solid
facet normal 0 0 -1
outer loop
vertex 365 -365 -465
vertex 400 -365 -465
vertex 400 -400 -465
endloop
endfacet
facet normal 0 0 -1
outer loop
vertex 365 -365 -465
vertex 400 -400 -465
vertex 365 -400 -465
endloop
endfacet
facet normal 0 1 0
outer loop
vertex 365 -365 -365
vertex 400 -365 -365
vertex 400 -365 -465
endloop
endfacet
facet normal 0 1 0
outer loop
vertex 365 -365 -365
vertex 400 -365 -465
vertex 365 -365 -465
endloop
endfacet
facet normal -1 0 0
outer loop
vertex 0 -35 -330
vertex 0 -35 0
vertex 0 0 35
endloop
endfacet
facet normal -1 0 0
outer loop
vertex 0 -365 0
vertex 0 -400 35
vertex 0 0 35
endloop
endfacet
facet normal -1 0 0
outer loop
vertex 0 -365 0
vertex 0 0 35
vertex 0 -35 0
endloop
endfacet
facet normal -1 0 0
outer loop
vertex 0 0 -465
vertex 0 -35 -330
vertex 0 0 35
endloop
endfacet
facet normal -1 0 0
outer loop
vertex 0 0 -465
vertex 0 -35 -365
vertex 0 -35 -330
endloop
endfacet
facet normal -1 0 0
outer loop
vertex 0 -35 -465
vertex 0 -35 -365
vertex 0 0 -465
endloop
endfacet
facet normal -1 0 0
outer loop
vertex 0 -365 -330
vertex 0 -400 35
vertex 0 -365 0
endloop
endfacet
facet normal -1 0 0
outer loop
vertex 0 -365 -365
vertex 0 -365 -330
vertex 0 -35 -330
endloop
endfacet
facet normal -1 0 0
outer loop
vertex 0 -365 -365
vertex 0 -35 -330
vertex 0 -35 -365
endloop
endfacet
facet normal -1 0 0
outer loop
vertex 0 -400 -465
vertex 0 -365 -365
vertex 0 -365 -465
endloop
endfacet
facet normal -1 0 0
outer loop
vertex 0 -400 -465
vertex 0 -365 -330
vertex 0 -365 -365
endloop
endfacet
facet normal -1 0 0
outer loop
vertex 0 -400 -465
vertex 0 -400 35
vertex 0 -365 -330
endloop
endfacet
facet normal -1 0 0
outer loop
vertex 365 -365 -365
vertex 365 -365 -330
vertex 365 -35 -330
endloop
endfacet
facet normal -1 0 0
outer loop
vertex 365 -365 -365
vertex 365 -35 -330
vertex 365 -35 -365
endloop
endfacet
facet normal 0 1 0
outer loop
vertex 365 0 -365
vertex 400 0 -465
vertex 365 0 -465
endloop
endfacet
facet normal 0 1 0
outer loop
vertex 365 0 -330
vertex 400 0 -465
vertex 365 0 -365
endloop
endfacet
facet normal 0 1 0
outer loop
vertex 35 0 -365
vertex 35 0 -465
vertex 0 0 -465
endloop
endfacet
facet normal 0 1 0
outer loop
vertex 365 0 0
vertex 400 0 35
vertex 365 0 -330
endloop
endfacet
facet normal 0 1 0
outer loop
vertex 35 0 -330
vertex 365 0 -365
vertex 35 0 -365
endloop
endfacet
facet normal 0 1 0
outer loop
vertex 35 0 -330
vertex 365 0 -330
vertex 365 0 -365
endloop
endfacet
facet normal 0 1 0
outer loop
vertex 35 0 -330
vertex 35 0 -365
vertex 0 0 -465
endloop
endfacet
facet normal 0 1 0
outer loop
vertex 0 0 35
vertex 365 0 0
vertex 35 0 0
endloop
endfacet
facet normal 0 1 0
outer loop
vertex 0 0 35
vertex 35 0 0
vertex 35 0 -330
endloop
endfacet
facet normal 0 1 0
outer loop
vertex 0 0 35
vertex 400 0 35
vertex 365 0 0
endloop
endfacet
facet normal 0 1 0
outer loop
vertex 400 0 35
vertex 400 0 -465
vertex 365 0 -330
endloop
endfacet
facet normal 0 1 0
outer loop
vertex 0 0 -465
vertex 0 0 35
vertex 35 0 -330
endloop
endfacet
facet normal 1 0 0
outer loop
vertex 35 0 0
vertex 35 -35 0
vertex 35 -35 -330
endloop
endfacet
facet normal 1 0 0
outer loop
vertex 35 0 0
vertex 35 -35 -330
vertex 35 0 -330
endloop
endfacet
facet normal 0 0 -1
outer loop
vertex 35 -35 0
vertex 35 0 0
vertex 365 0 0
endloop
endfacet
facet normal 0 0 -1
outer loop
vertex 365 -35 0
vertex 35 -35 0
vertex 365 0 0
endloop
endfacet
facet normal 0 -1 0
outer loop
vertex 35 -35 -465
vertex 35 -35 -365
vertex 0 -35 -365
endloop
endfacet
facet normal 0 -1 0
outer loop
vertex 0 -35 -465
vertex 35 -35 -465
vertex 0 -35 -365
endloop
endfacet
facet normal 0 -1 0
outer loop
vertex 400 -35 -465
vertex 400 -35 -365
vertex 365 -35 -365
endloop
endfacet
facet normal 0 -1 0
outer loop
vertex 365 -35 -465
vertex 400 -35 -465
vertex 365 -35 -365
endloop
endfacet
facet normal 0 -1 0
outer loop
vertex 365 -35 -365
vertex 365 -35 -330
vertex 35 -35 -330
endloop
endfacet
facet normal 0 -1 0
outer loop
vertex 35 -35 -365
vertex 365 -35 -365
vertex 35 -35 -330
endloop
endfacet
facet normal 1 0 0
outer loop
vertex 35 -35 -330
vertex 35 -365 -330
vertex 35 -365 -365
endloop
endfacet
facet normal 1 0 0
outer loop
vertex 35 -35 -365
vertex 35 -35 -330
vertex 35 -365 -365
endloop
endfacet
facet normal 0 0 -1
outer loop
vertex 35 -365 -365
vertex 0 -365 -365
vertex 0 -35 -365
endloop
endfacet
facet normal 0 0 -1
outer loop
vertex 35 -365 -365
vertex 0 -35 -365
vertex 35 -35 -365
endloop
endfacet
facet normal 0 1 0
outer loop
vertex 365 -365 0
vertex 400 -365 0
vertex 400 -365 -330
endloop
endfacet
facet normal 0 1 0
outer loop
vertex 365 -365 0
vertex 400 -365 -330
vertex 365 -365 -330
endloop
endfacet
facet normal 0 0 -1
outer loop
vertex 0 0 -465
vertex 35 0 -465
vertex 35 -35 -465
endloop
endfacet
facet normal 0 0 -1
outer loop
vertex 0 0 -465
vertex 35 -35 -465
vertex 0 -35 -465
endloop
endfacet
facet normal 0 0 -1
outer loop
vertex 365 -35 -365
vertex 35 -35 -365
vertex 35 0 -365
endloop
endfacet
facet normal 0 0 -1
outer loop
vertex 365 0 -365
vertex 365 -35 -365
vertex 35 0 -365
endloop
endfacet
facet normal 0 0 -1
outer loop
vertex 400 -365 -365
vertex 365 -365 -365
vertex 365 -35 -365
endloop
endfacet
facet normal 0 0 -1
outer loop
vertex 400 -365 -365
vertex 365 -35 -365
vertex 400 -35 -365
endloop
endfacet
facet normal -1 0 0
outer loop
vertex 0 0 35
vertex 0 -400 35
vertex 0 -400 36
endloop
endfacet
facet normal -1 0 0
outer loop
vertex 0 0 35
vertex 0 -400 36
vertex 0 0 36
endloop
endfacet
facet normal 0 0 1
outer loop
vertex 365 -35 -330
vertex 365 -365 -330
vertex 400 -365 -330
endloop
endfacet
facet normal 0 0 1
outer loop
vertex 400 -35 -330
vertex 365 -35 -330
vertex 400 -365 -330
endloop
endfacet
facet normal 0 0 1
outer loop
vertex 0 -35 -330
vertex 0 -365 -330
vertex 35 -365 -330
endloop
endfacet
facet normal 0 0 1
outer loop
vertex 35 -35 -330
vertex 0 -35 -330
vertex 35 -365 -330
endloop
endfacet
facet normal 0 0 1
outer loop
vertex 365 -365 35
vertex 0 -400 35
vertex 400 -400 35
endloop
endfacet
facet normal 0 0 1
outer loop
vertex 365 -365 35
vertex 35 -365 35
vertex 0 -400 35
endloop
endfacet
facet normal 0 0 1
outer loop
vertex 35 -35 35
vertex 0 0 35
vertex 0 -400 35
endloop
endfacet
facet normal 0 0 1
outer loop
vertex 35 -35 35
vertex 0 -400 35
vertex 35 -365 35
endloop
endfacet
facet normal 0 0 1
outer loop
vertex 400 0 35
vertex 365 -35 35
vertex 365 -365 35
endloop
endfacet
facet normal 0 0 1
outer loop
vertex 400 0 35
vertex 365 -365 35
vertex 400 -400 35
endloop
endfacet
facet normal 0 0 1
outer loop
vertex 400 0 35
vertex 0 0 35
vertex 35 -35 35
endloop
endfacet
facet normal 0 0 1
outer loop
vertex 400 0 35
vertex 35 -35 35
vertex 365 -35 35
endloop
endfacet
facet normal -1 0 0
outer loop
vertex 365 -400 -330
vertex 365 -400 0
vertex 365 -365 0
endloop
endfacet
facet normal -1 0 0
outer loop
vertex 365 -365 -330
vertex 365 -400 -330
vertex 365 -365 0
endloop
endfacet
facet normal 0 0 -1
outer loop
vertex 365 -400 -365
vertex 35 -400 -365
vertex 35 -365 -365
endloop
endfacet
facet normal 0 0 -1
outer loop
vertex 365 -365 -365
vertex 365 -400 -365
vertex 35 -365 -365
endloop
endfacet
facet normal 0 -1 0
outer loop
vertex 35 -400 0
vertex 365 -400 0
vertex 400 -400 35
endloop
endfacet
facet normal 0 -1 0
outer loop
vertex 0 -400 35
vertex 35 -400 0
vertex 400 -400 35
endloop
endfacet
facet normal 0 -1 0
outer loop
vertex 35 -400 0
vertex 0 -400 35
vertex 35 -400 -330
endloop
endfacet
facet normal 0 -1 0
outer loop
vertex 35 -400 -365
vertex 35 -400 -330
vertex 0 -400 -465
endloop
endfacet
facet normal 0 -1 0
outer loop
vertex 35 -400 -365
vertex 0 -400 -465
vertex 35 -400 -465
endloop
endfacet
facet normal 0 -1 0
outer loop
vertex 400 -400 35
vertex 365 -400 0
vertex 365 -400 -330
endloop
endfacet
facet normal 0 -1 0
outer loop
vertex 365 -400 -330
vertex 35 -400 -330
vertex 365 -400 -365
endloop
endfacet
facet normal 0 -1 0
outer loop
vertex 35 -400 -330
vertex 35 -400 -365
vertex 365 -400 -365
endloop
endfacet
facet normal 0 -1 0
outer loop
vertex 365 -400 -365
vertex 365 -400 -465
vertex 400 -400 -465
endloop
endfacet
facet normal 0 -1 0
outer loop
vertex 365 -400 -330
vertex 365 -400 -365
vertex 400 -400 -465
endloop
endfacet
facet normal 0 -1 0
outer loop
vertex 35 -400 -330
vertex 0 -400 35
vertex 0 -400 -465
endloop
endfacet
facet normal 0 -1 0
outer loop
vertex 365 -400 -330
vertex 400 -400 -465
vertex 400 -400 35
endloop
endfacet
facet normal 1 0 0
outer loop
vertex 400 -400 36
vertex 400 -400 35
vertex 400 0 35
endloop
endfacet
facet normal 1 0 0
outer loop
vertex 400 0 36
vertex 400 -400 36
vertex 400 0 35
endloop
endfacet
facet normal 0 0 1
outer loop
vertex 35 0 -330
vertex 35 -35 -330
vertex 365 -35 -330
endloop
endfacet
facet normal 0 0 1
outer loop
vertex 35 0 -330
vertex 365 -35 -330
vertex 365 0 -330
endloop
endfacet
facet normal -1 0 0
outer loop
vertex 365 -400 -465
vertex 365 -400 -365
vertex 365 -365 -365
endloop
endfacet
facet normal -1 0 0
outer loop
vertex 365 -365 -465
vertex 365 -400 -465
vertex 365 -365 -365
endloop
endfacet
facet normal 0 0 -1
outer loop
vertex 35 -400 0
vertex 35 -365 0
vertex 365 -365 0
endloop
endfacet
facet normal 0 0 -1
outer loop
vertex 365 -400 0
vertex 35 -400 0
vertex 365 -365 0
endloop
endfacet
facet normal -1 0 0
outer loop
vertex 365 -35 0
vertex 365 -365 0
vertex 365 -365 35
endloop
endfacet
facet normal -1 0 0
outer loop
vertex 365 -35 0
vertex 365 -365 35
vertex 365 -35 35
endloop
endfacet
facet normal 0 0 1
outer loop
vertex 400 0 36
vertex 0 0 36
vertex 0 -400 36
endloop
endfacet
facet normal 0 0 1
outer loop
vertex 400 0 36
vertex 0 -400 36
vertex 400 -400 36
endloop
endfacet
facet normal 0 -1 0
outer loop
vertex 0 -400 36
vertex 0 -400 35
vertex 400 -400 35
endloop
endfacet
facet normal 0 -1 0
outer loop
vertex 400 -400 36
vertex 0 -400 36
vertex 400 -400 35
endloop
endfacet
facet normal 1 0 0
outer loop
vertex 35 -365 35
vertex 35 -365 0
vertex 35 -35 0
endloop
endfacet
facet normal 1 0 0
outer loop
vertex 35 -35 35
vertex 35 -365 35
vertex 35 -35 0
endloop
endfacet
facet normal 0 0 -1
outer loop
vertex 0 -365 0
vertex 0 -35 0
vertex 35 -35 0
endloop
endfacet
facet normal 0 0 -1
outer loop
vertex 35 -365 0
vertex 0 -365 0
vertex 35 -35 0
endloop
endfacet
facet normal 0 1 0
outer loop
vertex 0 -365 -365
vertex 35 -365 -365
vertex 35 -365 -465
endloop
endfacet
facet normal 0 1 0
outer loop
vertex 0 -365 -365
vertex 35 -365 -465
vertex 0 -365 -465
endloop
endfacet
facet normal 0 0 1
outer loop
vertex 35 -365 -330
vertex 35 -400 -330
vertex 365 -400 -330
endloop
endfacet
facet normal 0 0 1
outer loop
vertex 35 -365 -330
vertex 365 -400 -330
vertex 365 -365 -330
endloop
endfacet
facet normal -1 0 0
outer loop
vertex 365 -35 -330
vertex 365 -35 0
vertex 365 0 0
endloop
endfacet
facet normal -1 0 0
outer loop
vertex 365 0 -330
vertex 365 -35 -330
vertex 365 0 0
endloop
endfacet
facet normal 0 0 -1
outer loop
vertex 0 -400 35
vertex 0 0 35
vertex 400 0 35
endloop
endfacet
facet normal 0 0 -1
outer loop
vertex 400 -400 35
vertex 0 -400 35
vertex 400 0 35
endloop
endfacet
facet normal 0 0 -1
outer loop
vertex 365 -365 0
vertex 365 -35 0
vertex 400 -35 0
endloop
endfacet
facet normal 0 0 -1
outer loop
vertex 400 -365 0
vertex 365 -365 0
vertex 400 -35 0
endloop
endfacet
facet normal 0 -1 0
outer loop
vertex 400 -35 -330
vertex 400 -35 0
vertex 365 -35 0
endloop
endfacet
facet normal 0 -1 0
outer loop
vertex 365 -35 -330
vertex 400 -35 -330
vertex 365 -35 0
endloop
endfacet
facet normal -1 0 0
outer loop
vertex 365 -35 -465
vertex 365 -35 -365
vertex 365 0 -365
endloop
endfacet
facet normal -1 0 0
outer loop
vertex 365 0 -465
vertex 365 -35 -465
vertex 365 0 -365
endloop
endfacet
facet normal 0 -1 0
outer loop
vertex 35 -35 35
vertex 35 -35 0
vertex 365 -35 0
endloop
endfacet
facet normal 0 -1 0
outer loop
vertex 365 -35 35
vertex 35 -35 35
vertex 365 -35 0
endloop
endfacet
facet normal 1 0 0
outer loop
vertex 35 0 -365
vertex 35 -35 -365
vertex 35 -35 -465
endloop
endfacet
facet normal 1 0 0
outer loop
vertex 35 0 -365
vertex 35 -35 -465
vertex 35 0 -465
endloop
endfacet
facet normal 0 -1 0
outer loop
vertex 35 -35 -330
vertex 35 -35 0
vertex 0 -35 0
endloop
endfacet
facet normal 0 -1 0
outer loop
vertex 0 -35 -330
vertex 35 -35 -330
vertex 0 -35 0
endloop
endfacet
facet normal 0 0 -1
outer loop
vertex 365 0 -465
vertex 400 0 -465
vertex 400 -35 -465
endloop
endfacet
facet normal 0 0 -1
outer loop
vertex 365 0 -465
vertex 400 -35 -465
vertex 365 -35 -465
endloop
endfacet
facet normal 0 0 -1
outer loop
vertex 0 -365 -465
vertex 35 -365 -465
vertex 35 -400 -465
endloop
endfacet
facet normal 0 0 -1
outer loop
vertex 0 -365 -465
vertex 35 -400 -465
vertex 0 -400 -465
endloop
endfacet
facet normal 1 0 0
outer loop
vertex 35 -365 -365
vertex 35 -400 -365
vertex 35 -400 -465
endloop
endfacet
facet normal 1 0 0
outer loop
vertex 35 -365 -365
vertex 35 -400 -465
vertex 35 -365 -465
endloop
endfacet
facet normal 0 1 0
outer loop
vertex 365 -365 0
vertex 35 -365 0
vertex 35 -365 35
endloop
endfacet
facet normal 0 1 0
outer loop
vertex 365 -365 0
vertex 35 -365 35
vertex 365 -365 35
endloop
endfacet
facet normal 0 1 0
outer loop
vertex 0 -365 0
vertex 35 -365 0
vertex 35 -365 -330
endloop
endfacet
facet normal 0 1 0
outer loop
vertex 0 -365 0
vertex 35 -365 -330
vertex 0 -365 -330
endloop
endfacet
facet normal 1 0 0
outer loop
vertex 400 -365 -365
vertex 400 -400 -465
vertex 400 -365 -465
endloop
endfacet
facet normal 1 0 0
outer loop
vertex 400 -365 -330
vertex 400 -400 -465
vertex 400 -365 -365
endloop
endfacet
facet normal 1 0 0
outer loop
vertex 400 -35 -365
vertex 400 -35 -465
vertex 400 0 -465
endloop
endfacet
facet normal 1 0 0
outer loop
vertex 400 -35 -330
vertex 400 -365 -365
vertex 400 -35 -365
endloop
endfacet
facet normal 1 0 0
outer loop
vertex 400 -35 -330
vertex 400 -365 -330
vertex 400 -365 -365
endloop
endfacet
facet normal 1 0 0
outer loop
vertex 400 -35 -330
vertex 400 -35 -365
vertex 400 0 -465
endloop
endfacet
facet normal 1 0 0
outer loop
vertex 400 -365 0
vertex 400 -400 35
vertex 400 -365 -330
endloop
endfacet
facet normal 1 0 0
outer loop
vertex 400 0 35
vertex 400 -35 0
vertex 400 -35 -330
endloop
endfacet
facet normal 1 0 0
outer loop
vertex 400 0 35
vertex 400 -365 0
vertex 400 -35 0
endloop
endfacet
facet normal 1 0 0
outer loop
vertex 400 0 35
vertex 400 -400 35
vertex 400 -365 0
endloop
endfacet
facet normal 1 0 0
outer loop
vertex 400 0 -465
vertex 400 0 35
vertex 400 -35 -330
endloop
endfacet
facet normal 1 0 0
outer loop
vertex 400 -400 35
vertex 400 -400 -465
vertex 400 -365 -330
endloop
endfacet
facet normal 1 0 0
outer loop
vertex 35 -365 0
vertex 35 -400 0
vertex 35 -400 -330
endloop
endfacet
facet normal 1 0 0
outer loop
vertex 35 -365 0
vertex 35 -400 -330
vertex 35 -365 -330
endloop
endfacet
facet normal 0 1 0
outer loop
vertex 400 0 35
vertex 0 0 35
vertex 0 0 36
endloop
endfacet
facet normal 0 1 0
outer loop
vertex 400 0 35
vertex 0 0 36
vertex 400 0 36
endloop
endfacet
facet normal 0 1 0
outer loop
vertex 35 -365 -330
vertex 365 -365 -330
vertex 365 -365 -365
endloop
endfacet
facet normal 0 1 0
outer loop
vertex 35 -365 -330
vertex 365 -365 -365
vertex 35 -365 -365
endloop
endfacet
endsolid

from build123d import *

# Parameters (mm, degrees)
ESQUISSE1_W        = 400
ESQUISSE1_H        = 400
ESQUISSE1_W_2      = 330
ESQUISSE1_H_2      = 330
EXTRU_MINCE1_DEPTH = 35
ESQUISSE2_W        = 35
ESQUISSE2_H        = 35
BOSS_EXTRU_1_DEPTH = 465
ESQUISSE3_W        = 400
ESQUISSE3_H        = 400
BOSS_EXTRU_2_DEPTH = 1
ESQUISSE4_W        = 35
ESQUISSE4_H        = 35
BOSS_EXTRU_3_DEPTH = 330
ESQUISSE5_W        = 35
ESQUISSE5_H        = 35
BOSS_EXTRU_4_DEPTH = 330


with BuildPart() as part:
    # Esquisse1 → Extru.-Mince1 (new body)
    with BuildSketch(Plane.XY):
        with Locations((200, -200)):
            Rectangle(ESQUISSE1_W, ESQUISSE1_H)
        with Locations((200, -200)):
            Rectangle(ESQUISSE1_W_2, ESQUISSE1_H_2, mode=Mode.SUBTRACT)
    extrude(amount=EXTRU_MINCE1_DEPTH)

    # Esquisse2 → Boss.-Extru.1 (add)
    with BuildSketch(Plane(origin=(0, 0, 0), x_dir=(-1, 0, 0), z_dir=(0, 0, -1))):
        with Locations((-382.5, -17.5)):
            Rectangle(ESQUISSE2_W, ESQUISSE2_H)
        with Locations((-17.5, -17.5)):
            Rectangle(ESQUISSE2_W, ESQUISSE2_H)
        with Locations((-17.5, -382.5)):
            Rectangle(ESQUISSE2_W, ESQUISSE2_H)
        with Locations((-382.5, -382.5)):
            Rectangle(ESQUISSE2_W, ESQUISSE2_H)
    extrude(amount=BOSS_EXTRU_1_DEPTH)

    # Esquisse4 → Boss.-Extru.3 (add)
    with BuildSketch(Plane(origin=(35, 0, 0), x_dir=(0, 0, -1), z_dir=(1, 0, 0))):
        with Locations((347.5, -17.5)):
            Rectangle(ESQUISSE4_W, ESQUISSE4_H)
        with Locations((347.5, -382.5)):
            Rectangle(ESQUISSE4_W, ESQUISSE4_H)
    extrude(amount=BOSS_EXTRU_3_DEPTH)

    # Esquisse5 → Boss.-Extru.4 (add)
    with BuildSketch(Plane(origin=(0, -365, 0), x_dir=(1, 0, 0), z_dir=(0, 1, 0))):
        with Locations((17.5, 347.5)):
            Rectangle(ESQUISSE5_W, ESQUISSE5_H)
        with Locations((382.5, 347.5)):
            Rectangle(ESQUISSE5_W, ESQUISSE5_H)
    extrude(amount=BOSS_EXTRU_4_DEPTH)


with BuildPart() as body_2:
    # Esquisse3 → Boss.-Extru.2 (new body)
    with BuildSketch(Plane.XY.offset(35)):
        with Locations((200, -200)):
            Rectangle(ESQUISSE3_W, ESQUISSE3_H)
    extrude(amount=BOSS_EXTRU_2_DEPTH)


solid = Compound([part.part, body_2.part])
